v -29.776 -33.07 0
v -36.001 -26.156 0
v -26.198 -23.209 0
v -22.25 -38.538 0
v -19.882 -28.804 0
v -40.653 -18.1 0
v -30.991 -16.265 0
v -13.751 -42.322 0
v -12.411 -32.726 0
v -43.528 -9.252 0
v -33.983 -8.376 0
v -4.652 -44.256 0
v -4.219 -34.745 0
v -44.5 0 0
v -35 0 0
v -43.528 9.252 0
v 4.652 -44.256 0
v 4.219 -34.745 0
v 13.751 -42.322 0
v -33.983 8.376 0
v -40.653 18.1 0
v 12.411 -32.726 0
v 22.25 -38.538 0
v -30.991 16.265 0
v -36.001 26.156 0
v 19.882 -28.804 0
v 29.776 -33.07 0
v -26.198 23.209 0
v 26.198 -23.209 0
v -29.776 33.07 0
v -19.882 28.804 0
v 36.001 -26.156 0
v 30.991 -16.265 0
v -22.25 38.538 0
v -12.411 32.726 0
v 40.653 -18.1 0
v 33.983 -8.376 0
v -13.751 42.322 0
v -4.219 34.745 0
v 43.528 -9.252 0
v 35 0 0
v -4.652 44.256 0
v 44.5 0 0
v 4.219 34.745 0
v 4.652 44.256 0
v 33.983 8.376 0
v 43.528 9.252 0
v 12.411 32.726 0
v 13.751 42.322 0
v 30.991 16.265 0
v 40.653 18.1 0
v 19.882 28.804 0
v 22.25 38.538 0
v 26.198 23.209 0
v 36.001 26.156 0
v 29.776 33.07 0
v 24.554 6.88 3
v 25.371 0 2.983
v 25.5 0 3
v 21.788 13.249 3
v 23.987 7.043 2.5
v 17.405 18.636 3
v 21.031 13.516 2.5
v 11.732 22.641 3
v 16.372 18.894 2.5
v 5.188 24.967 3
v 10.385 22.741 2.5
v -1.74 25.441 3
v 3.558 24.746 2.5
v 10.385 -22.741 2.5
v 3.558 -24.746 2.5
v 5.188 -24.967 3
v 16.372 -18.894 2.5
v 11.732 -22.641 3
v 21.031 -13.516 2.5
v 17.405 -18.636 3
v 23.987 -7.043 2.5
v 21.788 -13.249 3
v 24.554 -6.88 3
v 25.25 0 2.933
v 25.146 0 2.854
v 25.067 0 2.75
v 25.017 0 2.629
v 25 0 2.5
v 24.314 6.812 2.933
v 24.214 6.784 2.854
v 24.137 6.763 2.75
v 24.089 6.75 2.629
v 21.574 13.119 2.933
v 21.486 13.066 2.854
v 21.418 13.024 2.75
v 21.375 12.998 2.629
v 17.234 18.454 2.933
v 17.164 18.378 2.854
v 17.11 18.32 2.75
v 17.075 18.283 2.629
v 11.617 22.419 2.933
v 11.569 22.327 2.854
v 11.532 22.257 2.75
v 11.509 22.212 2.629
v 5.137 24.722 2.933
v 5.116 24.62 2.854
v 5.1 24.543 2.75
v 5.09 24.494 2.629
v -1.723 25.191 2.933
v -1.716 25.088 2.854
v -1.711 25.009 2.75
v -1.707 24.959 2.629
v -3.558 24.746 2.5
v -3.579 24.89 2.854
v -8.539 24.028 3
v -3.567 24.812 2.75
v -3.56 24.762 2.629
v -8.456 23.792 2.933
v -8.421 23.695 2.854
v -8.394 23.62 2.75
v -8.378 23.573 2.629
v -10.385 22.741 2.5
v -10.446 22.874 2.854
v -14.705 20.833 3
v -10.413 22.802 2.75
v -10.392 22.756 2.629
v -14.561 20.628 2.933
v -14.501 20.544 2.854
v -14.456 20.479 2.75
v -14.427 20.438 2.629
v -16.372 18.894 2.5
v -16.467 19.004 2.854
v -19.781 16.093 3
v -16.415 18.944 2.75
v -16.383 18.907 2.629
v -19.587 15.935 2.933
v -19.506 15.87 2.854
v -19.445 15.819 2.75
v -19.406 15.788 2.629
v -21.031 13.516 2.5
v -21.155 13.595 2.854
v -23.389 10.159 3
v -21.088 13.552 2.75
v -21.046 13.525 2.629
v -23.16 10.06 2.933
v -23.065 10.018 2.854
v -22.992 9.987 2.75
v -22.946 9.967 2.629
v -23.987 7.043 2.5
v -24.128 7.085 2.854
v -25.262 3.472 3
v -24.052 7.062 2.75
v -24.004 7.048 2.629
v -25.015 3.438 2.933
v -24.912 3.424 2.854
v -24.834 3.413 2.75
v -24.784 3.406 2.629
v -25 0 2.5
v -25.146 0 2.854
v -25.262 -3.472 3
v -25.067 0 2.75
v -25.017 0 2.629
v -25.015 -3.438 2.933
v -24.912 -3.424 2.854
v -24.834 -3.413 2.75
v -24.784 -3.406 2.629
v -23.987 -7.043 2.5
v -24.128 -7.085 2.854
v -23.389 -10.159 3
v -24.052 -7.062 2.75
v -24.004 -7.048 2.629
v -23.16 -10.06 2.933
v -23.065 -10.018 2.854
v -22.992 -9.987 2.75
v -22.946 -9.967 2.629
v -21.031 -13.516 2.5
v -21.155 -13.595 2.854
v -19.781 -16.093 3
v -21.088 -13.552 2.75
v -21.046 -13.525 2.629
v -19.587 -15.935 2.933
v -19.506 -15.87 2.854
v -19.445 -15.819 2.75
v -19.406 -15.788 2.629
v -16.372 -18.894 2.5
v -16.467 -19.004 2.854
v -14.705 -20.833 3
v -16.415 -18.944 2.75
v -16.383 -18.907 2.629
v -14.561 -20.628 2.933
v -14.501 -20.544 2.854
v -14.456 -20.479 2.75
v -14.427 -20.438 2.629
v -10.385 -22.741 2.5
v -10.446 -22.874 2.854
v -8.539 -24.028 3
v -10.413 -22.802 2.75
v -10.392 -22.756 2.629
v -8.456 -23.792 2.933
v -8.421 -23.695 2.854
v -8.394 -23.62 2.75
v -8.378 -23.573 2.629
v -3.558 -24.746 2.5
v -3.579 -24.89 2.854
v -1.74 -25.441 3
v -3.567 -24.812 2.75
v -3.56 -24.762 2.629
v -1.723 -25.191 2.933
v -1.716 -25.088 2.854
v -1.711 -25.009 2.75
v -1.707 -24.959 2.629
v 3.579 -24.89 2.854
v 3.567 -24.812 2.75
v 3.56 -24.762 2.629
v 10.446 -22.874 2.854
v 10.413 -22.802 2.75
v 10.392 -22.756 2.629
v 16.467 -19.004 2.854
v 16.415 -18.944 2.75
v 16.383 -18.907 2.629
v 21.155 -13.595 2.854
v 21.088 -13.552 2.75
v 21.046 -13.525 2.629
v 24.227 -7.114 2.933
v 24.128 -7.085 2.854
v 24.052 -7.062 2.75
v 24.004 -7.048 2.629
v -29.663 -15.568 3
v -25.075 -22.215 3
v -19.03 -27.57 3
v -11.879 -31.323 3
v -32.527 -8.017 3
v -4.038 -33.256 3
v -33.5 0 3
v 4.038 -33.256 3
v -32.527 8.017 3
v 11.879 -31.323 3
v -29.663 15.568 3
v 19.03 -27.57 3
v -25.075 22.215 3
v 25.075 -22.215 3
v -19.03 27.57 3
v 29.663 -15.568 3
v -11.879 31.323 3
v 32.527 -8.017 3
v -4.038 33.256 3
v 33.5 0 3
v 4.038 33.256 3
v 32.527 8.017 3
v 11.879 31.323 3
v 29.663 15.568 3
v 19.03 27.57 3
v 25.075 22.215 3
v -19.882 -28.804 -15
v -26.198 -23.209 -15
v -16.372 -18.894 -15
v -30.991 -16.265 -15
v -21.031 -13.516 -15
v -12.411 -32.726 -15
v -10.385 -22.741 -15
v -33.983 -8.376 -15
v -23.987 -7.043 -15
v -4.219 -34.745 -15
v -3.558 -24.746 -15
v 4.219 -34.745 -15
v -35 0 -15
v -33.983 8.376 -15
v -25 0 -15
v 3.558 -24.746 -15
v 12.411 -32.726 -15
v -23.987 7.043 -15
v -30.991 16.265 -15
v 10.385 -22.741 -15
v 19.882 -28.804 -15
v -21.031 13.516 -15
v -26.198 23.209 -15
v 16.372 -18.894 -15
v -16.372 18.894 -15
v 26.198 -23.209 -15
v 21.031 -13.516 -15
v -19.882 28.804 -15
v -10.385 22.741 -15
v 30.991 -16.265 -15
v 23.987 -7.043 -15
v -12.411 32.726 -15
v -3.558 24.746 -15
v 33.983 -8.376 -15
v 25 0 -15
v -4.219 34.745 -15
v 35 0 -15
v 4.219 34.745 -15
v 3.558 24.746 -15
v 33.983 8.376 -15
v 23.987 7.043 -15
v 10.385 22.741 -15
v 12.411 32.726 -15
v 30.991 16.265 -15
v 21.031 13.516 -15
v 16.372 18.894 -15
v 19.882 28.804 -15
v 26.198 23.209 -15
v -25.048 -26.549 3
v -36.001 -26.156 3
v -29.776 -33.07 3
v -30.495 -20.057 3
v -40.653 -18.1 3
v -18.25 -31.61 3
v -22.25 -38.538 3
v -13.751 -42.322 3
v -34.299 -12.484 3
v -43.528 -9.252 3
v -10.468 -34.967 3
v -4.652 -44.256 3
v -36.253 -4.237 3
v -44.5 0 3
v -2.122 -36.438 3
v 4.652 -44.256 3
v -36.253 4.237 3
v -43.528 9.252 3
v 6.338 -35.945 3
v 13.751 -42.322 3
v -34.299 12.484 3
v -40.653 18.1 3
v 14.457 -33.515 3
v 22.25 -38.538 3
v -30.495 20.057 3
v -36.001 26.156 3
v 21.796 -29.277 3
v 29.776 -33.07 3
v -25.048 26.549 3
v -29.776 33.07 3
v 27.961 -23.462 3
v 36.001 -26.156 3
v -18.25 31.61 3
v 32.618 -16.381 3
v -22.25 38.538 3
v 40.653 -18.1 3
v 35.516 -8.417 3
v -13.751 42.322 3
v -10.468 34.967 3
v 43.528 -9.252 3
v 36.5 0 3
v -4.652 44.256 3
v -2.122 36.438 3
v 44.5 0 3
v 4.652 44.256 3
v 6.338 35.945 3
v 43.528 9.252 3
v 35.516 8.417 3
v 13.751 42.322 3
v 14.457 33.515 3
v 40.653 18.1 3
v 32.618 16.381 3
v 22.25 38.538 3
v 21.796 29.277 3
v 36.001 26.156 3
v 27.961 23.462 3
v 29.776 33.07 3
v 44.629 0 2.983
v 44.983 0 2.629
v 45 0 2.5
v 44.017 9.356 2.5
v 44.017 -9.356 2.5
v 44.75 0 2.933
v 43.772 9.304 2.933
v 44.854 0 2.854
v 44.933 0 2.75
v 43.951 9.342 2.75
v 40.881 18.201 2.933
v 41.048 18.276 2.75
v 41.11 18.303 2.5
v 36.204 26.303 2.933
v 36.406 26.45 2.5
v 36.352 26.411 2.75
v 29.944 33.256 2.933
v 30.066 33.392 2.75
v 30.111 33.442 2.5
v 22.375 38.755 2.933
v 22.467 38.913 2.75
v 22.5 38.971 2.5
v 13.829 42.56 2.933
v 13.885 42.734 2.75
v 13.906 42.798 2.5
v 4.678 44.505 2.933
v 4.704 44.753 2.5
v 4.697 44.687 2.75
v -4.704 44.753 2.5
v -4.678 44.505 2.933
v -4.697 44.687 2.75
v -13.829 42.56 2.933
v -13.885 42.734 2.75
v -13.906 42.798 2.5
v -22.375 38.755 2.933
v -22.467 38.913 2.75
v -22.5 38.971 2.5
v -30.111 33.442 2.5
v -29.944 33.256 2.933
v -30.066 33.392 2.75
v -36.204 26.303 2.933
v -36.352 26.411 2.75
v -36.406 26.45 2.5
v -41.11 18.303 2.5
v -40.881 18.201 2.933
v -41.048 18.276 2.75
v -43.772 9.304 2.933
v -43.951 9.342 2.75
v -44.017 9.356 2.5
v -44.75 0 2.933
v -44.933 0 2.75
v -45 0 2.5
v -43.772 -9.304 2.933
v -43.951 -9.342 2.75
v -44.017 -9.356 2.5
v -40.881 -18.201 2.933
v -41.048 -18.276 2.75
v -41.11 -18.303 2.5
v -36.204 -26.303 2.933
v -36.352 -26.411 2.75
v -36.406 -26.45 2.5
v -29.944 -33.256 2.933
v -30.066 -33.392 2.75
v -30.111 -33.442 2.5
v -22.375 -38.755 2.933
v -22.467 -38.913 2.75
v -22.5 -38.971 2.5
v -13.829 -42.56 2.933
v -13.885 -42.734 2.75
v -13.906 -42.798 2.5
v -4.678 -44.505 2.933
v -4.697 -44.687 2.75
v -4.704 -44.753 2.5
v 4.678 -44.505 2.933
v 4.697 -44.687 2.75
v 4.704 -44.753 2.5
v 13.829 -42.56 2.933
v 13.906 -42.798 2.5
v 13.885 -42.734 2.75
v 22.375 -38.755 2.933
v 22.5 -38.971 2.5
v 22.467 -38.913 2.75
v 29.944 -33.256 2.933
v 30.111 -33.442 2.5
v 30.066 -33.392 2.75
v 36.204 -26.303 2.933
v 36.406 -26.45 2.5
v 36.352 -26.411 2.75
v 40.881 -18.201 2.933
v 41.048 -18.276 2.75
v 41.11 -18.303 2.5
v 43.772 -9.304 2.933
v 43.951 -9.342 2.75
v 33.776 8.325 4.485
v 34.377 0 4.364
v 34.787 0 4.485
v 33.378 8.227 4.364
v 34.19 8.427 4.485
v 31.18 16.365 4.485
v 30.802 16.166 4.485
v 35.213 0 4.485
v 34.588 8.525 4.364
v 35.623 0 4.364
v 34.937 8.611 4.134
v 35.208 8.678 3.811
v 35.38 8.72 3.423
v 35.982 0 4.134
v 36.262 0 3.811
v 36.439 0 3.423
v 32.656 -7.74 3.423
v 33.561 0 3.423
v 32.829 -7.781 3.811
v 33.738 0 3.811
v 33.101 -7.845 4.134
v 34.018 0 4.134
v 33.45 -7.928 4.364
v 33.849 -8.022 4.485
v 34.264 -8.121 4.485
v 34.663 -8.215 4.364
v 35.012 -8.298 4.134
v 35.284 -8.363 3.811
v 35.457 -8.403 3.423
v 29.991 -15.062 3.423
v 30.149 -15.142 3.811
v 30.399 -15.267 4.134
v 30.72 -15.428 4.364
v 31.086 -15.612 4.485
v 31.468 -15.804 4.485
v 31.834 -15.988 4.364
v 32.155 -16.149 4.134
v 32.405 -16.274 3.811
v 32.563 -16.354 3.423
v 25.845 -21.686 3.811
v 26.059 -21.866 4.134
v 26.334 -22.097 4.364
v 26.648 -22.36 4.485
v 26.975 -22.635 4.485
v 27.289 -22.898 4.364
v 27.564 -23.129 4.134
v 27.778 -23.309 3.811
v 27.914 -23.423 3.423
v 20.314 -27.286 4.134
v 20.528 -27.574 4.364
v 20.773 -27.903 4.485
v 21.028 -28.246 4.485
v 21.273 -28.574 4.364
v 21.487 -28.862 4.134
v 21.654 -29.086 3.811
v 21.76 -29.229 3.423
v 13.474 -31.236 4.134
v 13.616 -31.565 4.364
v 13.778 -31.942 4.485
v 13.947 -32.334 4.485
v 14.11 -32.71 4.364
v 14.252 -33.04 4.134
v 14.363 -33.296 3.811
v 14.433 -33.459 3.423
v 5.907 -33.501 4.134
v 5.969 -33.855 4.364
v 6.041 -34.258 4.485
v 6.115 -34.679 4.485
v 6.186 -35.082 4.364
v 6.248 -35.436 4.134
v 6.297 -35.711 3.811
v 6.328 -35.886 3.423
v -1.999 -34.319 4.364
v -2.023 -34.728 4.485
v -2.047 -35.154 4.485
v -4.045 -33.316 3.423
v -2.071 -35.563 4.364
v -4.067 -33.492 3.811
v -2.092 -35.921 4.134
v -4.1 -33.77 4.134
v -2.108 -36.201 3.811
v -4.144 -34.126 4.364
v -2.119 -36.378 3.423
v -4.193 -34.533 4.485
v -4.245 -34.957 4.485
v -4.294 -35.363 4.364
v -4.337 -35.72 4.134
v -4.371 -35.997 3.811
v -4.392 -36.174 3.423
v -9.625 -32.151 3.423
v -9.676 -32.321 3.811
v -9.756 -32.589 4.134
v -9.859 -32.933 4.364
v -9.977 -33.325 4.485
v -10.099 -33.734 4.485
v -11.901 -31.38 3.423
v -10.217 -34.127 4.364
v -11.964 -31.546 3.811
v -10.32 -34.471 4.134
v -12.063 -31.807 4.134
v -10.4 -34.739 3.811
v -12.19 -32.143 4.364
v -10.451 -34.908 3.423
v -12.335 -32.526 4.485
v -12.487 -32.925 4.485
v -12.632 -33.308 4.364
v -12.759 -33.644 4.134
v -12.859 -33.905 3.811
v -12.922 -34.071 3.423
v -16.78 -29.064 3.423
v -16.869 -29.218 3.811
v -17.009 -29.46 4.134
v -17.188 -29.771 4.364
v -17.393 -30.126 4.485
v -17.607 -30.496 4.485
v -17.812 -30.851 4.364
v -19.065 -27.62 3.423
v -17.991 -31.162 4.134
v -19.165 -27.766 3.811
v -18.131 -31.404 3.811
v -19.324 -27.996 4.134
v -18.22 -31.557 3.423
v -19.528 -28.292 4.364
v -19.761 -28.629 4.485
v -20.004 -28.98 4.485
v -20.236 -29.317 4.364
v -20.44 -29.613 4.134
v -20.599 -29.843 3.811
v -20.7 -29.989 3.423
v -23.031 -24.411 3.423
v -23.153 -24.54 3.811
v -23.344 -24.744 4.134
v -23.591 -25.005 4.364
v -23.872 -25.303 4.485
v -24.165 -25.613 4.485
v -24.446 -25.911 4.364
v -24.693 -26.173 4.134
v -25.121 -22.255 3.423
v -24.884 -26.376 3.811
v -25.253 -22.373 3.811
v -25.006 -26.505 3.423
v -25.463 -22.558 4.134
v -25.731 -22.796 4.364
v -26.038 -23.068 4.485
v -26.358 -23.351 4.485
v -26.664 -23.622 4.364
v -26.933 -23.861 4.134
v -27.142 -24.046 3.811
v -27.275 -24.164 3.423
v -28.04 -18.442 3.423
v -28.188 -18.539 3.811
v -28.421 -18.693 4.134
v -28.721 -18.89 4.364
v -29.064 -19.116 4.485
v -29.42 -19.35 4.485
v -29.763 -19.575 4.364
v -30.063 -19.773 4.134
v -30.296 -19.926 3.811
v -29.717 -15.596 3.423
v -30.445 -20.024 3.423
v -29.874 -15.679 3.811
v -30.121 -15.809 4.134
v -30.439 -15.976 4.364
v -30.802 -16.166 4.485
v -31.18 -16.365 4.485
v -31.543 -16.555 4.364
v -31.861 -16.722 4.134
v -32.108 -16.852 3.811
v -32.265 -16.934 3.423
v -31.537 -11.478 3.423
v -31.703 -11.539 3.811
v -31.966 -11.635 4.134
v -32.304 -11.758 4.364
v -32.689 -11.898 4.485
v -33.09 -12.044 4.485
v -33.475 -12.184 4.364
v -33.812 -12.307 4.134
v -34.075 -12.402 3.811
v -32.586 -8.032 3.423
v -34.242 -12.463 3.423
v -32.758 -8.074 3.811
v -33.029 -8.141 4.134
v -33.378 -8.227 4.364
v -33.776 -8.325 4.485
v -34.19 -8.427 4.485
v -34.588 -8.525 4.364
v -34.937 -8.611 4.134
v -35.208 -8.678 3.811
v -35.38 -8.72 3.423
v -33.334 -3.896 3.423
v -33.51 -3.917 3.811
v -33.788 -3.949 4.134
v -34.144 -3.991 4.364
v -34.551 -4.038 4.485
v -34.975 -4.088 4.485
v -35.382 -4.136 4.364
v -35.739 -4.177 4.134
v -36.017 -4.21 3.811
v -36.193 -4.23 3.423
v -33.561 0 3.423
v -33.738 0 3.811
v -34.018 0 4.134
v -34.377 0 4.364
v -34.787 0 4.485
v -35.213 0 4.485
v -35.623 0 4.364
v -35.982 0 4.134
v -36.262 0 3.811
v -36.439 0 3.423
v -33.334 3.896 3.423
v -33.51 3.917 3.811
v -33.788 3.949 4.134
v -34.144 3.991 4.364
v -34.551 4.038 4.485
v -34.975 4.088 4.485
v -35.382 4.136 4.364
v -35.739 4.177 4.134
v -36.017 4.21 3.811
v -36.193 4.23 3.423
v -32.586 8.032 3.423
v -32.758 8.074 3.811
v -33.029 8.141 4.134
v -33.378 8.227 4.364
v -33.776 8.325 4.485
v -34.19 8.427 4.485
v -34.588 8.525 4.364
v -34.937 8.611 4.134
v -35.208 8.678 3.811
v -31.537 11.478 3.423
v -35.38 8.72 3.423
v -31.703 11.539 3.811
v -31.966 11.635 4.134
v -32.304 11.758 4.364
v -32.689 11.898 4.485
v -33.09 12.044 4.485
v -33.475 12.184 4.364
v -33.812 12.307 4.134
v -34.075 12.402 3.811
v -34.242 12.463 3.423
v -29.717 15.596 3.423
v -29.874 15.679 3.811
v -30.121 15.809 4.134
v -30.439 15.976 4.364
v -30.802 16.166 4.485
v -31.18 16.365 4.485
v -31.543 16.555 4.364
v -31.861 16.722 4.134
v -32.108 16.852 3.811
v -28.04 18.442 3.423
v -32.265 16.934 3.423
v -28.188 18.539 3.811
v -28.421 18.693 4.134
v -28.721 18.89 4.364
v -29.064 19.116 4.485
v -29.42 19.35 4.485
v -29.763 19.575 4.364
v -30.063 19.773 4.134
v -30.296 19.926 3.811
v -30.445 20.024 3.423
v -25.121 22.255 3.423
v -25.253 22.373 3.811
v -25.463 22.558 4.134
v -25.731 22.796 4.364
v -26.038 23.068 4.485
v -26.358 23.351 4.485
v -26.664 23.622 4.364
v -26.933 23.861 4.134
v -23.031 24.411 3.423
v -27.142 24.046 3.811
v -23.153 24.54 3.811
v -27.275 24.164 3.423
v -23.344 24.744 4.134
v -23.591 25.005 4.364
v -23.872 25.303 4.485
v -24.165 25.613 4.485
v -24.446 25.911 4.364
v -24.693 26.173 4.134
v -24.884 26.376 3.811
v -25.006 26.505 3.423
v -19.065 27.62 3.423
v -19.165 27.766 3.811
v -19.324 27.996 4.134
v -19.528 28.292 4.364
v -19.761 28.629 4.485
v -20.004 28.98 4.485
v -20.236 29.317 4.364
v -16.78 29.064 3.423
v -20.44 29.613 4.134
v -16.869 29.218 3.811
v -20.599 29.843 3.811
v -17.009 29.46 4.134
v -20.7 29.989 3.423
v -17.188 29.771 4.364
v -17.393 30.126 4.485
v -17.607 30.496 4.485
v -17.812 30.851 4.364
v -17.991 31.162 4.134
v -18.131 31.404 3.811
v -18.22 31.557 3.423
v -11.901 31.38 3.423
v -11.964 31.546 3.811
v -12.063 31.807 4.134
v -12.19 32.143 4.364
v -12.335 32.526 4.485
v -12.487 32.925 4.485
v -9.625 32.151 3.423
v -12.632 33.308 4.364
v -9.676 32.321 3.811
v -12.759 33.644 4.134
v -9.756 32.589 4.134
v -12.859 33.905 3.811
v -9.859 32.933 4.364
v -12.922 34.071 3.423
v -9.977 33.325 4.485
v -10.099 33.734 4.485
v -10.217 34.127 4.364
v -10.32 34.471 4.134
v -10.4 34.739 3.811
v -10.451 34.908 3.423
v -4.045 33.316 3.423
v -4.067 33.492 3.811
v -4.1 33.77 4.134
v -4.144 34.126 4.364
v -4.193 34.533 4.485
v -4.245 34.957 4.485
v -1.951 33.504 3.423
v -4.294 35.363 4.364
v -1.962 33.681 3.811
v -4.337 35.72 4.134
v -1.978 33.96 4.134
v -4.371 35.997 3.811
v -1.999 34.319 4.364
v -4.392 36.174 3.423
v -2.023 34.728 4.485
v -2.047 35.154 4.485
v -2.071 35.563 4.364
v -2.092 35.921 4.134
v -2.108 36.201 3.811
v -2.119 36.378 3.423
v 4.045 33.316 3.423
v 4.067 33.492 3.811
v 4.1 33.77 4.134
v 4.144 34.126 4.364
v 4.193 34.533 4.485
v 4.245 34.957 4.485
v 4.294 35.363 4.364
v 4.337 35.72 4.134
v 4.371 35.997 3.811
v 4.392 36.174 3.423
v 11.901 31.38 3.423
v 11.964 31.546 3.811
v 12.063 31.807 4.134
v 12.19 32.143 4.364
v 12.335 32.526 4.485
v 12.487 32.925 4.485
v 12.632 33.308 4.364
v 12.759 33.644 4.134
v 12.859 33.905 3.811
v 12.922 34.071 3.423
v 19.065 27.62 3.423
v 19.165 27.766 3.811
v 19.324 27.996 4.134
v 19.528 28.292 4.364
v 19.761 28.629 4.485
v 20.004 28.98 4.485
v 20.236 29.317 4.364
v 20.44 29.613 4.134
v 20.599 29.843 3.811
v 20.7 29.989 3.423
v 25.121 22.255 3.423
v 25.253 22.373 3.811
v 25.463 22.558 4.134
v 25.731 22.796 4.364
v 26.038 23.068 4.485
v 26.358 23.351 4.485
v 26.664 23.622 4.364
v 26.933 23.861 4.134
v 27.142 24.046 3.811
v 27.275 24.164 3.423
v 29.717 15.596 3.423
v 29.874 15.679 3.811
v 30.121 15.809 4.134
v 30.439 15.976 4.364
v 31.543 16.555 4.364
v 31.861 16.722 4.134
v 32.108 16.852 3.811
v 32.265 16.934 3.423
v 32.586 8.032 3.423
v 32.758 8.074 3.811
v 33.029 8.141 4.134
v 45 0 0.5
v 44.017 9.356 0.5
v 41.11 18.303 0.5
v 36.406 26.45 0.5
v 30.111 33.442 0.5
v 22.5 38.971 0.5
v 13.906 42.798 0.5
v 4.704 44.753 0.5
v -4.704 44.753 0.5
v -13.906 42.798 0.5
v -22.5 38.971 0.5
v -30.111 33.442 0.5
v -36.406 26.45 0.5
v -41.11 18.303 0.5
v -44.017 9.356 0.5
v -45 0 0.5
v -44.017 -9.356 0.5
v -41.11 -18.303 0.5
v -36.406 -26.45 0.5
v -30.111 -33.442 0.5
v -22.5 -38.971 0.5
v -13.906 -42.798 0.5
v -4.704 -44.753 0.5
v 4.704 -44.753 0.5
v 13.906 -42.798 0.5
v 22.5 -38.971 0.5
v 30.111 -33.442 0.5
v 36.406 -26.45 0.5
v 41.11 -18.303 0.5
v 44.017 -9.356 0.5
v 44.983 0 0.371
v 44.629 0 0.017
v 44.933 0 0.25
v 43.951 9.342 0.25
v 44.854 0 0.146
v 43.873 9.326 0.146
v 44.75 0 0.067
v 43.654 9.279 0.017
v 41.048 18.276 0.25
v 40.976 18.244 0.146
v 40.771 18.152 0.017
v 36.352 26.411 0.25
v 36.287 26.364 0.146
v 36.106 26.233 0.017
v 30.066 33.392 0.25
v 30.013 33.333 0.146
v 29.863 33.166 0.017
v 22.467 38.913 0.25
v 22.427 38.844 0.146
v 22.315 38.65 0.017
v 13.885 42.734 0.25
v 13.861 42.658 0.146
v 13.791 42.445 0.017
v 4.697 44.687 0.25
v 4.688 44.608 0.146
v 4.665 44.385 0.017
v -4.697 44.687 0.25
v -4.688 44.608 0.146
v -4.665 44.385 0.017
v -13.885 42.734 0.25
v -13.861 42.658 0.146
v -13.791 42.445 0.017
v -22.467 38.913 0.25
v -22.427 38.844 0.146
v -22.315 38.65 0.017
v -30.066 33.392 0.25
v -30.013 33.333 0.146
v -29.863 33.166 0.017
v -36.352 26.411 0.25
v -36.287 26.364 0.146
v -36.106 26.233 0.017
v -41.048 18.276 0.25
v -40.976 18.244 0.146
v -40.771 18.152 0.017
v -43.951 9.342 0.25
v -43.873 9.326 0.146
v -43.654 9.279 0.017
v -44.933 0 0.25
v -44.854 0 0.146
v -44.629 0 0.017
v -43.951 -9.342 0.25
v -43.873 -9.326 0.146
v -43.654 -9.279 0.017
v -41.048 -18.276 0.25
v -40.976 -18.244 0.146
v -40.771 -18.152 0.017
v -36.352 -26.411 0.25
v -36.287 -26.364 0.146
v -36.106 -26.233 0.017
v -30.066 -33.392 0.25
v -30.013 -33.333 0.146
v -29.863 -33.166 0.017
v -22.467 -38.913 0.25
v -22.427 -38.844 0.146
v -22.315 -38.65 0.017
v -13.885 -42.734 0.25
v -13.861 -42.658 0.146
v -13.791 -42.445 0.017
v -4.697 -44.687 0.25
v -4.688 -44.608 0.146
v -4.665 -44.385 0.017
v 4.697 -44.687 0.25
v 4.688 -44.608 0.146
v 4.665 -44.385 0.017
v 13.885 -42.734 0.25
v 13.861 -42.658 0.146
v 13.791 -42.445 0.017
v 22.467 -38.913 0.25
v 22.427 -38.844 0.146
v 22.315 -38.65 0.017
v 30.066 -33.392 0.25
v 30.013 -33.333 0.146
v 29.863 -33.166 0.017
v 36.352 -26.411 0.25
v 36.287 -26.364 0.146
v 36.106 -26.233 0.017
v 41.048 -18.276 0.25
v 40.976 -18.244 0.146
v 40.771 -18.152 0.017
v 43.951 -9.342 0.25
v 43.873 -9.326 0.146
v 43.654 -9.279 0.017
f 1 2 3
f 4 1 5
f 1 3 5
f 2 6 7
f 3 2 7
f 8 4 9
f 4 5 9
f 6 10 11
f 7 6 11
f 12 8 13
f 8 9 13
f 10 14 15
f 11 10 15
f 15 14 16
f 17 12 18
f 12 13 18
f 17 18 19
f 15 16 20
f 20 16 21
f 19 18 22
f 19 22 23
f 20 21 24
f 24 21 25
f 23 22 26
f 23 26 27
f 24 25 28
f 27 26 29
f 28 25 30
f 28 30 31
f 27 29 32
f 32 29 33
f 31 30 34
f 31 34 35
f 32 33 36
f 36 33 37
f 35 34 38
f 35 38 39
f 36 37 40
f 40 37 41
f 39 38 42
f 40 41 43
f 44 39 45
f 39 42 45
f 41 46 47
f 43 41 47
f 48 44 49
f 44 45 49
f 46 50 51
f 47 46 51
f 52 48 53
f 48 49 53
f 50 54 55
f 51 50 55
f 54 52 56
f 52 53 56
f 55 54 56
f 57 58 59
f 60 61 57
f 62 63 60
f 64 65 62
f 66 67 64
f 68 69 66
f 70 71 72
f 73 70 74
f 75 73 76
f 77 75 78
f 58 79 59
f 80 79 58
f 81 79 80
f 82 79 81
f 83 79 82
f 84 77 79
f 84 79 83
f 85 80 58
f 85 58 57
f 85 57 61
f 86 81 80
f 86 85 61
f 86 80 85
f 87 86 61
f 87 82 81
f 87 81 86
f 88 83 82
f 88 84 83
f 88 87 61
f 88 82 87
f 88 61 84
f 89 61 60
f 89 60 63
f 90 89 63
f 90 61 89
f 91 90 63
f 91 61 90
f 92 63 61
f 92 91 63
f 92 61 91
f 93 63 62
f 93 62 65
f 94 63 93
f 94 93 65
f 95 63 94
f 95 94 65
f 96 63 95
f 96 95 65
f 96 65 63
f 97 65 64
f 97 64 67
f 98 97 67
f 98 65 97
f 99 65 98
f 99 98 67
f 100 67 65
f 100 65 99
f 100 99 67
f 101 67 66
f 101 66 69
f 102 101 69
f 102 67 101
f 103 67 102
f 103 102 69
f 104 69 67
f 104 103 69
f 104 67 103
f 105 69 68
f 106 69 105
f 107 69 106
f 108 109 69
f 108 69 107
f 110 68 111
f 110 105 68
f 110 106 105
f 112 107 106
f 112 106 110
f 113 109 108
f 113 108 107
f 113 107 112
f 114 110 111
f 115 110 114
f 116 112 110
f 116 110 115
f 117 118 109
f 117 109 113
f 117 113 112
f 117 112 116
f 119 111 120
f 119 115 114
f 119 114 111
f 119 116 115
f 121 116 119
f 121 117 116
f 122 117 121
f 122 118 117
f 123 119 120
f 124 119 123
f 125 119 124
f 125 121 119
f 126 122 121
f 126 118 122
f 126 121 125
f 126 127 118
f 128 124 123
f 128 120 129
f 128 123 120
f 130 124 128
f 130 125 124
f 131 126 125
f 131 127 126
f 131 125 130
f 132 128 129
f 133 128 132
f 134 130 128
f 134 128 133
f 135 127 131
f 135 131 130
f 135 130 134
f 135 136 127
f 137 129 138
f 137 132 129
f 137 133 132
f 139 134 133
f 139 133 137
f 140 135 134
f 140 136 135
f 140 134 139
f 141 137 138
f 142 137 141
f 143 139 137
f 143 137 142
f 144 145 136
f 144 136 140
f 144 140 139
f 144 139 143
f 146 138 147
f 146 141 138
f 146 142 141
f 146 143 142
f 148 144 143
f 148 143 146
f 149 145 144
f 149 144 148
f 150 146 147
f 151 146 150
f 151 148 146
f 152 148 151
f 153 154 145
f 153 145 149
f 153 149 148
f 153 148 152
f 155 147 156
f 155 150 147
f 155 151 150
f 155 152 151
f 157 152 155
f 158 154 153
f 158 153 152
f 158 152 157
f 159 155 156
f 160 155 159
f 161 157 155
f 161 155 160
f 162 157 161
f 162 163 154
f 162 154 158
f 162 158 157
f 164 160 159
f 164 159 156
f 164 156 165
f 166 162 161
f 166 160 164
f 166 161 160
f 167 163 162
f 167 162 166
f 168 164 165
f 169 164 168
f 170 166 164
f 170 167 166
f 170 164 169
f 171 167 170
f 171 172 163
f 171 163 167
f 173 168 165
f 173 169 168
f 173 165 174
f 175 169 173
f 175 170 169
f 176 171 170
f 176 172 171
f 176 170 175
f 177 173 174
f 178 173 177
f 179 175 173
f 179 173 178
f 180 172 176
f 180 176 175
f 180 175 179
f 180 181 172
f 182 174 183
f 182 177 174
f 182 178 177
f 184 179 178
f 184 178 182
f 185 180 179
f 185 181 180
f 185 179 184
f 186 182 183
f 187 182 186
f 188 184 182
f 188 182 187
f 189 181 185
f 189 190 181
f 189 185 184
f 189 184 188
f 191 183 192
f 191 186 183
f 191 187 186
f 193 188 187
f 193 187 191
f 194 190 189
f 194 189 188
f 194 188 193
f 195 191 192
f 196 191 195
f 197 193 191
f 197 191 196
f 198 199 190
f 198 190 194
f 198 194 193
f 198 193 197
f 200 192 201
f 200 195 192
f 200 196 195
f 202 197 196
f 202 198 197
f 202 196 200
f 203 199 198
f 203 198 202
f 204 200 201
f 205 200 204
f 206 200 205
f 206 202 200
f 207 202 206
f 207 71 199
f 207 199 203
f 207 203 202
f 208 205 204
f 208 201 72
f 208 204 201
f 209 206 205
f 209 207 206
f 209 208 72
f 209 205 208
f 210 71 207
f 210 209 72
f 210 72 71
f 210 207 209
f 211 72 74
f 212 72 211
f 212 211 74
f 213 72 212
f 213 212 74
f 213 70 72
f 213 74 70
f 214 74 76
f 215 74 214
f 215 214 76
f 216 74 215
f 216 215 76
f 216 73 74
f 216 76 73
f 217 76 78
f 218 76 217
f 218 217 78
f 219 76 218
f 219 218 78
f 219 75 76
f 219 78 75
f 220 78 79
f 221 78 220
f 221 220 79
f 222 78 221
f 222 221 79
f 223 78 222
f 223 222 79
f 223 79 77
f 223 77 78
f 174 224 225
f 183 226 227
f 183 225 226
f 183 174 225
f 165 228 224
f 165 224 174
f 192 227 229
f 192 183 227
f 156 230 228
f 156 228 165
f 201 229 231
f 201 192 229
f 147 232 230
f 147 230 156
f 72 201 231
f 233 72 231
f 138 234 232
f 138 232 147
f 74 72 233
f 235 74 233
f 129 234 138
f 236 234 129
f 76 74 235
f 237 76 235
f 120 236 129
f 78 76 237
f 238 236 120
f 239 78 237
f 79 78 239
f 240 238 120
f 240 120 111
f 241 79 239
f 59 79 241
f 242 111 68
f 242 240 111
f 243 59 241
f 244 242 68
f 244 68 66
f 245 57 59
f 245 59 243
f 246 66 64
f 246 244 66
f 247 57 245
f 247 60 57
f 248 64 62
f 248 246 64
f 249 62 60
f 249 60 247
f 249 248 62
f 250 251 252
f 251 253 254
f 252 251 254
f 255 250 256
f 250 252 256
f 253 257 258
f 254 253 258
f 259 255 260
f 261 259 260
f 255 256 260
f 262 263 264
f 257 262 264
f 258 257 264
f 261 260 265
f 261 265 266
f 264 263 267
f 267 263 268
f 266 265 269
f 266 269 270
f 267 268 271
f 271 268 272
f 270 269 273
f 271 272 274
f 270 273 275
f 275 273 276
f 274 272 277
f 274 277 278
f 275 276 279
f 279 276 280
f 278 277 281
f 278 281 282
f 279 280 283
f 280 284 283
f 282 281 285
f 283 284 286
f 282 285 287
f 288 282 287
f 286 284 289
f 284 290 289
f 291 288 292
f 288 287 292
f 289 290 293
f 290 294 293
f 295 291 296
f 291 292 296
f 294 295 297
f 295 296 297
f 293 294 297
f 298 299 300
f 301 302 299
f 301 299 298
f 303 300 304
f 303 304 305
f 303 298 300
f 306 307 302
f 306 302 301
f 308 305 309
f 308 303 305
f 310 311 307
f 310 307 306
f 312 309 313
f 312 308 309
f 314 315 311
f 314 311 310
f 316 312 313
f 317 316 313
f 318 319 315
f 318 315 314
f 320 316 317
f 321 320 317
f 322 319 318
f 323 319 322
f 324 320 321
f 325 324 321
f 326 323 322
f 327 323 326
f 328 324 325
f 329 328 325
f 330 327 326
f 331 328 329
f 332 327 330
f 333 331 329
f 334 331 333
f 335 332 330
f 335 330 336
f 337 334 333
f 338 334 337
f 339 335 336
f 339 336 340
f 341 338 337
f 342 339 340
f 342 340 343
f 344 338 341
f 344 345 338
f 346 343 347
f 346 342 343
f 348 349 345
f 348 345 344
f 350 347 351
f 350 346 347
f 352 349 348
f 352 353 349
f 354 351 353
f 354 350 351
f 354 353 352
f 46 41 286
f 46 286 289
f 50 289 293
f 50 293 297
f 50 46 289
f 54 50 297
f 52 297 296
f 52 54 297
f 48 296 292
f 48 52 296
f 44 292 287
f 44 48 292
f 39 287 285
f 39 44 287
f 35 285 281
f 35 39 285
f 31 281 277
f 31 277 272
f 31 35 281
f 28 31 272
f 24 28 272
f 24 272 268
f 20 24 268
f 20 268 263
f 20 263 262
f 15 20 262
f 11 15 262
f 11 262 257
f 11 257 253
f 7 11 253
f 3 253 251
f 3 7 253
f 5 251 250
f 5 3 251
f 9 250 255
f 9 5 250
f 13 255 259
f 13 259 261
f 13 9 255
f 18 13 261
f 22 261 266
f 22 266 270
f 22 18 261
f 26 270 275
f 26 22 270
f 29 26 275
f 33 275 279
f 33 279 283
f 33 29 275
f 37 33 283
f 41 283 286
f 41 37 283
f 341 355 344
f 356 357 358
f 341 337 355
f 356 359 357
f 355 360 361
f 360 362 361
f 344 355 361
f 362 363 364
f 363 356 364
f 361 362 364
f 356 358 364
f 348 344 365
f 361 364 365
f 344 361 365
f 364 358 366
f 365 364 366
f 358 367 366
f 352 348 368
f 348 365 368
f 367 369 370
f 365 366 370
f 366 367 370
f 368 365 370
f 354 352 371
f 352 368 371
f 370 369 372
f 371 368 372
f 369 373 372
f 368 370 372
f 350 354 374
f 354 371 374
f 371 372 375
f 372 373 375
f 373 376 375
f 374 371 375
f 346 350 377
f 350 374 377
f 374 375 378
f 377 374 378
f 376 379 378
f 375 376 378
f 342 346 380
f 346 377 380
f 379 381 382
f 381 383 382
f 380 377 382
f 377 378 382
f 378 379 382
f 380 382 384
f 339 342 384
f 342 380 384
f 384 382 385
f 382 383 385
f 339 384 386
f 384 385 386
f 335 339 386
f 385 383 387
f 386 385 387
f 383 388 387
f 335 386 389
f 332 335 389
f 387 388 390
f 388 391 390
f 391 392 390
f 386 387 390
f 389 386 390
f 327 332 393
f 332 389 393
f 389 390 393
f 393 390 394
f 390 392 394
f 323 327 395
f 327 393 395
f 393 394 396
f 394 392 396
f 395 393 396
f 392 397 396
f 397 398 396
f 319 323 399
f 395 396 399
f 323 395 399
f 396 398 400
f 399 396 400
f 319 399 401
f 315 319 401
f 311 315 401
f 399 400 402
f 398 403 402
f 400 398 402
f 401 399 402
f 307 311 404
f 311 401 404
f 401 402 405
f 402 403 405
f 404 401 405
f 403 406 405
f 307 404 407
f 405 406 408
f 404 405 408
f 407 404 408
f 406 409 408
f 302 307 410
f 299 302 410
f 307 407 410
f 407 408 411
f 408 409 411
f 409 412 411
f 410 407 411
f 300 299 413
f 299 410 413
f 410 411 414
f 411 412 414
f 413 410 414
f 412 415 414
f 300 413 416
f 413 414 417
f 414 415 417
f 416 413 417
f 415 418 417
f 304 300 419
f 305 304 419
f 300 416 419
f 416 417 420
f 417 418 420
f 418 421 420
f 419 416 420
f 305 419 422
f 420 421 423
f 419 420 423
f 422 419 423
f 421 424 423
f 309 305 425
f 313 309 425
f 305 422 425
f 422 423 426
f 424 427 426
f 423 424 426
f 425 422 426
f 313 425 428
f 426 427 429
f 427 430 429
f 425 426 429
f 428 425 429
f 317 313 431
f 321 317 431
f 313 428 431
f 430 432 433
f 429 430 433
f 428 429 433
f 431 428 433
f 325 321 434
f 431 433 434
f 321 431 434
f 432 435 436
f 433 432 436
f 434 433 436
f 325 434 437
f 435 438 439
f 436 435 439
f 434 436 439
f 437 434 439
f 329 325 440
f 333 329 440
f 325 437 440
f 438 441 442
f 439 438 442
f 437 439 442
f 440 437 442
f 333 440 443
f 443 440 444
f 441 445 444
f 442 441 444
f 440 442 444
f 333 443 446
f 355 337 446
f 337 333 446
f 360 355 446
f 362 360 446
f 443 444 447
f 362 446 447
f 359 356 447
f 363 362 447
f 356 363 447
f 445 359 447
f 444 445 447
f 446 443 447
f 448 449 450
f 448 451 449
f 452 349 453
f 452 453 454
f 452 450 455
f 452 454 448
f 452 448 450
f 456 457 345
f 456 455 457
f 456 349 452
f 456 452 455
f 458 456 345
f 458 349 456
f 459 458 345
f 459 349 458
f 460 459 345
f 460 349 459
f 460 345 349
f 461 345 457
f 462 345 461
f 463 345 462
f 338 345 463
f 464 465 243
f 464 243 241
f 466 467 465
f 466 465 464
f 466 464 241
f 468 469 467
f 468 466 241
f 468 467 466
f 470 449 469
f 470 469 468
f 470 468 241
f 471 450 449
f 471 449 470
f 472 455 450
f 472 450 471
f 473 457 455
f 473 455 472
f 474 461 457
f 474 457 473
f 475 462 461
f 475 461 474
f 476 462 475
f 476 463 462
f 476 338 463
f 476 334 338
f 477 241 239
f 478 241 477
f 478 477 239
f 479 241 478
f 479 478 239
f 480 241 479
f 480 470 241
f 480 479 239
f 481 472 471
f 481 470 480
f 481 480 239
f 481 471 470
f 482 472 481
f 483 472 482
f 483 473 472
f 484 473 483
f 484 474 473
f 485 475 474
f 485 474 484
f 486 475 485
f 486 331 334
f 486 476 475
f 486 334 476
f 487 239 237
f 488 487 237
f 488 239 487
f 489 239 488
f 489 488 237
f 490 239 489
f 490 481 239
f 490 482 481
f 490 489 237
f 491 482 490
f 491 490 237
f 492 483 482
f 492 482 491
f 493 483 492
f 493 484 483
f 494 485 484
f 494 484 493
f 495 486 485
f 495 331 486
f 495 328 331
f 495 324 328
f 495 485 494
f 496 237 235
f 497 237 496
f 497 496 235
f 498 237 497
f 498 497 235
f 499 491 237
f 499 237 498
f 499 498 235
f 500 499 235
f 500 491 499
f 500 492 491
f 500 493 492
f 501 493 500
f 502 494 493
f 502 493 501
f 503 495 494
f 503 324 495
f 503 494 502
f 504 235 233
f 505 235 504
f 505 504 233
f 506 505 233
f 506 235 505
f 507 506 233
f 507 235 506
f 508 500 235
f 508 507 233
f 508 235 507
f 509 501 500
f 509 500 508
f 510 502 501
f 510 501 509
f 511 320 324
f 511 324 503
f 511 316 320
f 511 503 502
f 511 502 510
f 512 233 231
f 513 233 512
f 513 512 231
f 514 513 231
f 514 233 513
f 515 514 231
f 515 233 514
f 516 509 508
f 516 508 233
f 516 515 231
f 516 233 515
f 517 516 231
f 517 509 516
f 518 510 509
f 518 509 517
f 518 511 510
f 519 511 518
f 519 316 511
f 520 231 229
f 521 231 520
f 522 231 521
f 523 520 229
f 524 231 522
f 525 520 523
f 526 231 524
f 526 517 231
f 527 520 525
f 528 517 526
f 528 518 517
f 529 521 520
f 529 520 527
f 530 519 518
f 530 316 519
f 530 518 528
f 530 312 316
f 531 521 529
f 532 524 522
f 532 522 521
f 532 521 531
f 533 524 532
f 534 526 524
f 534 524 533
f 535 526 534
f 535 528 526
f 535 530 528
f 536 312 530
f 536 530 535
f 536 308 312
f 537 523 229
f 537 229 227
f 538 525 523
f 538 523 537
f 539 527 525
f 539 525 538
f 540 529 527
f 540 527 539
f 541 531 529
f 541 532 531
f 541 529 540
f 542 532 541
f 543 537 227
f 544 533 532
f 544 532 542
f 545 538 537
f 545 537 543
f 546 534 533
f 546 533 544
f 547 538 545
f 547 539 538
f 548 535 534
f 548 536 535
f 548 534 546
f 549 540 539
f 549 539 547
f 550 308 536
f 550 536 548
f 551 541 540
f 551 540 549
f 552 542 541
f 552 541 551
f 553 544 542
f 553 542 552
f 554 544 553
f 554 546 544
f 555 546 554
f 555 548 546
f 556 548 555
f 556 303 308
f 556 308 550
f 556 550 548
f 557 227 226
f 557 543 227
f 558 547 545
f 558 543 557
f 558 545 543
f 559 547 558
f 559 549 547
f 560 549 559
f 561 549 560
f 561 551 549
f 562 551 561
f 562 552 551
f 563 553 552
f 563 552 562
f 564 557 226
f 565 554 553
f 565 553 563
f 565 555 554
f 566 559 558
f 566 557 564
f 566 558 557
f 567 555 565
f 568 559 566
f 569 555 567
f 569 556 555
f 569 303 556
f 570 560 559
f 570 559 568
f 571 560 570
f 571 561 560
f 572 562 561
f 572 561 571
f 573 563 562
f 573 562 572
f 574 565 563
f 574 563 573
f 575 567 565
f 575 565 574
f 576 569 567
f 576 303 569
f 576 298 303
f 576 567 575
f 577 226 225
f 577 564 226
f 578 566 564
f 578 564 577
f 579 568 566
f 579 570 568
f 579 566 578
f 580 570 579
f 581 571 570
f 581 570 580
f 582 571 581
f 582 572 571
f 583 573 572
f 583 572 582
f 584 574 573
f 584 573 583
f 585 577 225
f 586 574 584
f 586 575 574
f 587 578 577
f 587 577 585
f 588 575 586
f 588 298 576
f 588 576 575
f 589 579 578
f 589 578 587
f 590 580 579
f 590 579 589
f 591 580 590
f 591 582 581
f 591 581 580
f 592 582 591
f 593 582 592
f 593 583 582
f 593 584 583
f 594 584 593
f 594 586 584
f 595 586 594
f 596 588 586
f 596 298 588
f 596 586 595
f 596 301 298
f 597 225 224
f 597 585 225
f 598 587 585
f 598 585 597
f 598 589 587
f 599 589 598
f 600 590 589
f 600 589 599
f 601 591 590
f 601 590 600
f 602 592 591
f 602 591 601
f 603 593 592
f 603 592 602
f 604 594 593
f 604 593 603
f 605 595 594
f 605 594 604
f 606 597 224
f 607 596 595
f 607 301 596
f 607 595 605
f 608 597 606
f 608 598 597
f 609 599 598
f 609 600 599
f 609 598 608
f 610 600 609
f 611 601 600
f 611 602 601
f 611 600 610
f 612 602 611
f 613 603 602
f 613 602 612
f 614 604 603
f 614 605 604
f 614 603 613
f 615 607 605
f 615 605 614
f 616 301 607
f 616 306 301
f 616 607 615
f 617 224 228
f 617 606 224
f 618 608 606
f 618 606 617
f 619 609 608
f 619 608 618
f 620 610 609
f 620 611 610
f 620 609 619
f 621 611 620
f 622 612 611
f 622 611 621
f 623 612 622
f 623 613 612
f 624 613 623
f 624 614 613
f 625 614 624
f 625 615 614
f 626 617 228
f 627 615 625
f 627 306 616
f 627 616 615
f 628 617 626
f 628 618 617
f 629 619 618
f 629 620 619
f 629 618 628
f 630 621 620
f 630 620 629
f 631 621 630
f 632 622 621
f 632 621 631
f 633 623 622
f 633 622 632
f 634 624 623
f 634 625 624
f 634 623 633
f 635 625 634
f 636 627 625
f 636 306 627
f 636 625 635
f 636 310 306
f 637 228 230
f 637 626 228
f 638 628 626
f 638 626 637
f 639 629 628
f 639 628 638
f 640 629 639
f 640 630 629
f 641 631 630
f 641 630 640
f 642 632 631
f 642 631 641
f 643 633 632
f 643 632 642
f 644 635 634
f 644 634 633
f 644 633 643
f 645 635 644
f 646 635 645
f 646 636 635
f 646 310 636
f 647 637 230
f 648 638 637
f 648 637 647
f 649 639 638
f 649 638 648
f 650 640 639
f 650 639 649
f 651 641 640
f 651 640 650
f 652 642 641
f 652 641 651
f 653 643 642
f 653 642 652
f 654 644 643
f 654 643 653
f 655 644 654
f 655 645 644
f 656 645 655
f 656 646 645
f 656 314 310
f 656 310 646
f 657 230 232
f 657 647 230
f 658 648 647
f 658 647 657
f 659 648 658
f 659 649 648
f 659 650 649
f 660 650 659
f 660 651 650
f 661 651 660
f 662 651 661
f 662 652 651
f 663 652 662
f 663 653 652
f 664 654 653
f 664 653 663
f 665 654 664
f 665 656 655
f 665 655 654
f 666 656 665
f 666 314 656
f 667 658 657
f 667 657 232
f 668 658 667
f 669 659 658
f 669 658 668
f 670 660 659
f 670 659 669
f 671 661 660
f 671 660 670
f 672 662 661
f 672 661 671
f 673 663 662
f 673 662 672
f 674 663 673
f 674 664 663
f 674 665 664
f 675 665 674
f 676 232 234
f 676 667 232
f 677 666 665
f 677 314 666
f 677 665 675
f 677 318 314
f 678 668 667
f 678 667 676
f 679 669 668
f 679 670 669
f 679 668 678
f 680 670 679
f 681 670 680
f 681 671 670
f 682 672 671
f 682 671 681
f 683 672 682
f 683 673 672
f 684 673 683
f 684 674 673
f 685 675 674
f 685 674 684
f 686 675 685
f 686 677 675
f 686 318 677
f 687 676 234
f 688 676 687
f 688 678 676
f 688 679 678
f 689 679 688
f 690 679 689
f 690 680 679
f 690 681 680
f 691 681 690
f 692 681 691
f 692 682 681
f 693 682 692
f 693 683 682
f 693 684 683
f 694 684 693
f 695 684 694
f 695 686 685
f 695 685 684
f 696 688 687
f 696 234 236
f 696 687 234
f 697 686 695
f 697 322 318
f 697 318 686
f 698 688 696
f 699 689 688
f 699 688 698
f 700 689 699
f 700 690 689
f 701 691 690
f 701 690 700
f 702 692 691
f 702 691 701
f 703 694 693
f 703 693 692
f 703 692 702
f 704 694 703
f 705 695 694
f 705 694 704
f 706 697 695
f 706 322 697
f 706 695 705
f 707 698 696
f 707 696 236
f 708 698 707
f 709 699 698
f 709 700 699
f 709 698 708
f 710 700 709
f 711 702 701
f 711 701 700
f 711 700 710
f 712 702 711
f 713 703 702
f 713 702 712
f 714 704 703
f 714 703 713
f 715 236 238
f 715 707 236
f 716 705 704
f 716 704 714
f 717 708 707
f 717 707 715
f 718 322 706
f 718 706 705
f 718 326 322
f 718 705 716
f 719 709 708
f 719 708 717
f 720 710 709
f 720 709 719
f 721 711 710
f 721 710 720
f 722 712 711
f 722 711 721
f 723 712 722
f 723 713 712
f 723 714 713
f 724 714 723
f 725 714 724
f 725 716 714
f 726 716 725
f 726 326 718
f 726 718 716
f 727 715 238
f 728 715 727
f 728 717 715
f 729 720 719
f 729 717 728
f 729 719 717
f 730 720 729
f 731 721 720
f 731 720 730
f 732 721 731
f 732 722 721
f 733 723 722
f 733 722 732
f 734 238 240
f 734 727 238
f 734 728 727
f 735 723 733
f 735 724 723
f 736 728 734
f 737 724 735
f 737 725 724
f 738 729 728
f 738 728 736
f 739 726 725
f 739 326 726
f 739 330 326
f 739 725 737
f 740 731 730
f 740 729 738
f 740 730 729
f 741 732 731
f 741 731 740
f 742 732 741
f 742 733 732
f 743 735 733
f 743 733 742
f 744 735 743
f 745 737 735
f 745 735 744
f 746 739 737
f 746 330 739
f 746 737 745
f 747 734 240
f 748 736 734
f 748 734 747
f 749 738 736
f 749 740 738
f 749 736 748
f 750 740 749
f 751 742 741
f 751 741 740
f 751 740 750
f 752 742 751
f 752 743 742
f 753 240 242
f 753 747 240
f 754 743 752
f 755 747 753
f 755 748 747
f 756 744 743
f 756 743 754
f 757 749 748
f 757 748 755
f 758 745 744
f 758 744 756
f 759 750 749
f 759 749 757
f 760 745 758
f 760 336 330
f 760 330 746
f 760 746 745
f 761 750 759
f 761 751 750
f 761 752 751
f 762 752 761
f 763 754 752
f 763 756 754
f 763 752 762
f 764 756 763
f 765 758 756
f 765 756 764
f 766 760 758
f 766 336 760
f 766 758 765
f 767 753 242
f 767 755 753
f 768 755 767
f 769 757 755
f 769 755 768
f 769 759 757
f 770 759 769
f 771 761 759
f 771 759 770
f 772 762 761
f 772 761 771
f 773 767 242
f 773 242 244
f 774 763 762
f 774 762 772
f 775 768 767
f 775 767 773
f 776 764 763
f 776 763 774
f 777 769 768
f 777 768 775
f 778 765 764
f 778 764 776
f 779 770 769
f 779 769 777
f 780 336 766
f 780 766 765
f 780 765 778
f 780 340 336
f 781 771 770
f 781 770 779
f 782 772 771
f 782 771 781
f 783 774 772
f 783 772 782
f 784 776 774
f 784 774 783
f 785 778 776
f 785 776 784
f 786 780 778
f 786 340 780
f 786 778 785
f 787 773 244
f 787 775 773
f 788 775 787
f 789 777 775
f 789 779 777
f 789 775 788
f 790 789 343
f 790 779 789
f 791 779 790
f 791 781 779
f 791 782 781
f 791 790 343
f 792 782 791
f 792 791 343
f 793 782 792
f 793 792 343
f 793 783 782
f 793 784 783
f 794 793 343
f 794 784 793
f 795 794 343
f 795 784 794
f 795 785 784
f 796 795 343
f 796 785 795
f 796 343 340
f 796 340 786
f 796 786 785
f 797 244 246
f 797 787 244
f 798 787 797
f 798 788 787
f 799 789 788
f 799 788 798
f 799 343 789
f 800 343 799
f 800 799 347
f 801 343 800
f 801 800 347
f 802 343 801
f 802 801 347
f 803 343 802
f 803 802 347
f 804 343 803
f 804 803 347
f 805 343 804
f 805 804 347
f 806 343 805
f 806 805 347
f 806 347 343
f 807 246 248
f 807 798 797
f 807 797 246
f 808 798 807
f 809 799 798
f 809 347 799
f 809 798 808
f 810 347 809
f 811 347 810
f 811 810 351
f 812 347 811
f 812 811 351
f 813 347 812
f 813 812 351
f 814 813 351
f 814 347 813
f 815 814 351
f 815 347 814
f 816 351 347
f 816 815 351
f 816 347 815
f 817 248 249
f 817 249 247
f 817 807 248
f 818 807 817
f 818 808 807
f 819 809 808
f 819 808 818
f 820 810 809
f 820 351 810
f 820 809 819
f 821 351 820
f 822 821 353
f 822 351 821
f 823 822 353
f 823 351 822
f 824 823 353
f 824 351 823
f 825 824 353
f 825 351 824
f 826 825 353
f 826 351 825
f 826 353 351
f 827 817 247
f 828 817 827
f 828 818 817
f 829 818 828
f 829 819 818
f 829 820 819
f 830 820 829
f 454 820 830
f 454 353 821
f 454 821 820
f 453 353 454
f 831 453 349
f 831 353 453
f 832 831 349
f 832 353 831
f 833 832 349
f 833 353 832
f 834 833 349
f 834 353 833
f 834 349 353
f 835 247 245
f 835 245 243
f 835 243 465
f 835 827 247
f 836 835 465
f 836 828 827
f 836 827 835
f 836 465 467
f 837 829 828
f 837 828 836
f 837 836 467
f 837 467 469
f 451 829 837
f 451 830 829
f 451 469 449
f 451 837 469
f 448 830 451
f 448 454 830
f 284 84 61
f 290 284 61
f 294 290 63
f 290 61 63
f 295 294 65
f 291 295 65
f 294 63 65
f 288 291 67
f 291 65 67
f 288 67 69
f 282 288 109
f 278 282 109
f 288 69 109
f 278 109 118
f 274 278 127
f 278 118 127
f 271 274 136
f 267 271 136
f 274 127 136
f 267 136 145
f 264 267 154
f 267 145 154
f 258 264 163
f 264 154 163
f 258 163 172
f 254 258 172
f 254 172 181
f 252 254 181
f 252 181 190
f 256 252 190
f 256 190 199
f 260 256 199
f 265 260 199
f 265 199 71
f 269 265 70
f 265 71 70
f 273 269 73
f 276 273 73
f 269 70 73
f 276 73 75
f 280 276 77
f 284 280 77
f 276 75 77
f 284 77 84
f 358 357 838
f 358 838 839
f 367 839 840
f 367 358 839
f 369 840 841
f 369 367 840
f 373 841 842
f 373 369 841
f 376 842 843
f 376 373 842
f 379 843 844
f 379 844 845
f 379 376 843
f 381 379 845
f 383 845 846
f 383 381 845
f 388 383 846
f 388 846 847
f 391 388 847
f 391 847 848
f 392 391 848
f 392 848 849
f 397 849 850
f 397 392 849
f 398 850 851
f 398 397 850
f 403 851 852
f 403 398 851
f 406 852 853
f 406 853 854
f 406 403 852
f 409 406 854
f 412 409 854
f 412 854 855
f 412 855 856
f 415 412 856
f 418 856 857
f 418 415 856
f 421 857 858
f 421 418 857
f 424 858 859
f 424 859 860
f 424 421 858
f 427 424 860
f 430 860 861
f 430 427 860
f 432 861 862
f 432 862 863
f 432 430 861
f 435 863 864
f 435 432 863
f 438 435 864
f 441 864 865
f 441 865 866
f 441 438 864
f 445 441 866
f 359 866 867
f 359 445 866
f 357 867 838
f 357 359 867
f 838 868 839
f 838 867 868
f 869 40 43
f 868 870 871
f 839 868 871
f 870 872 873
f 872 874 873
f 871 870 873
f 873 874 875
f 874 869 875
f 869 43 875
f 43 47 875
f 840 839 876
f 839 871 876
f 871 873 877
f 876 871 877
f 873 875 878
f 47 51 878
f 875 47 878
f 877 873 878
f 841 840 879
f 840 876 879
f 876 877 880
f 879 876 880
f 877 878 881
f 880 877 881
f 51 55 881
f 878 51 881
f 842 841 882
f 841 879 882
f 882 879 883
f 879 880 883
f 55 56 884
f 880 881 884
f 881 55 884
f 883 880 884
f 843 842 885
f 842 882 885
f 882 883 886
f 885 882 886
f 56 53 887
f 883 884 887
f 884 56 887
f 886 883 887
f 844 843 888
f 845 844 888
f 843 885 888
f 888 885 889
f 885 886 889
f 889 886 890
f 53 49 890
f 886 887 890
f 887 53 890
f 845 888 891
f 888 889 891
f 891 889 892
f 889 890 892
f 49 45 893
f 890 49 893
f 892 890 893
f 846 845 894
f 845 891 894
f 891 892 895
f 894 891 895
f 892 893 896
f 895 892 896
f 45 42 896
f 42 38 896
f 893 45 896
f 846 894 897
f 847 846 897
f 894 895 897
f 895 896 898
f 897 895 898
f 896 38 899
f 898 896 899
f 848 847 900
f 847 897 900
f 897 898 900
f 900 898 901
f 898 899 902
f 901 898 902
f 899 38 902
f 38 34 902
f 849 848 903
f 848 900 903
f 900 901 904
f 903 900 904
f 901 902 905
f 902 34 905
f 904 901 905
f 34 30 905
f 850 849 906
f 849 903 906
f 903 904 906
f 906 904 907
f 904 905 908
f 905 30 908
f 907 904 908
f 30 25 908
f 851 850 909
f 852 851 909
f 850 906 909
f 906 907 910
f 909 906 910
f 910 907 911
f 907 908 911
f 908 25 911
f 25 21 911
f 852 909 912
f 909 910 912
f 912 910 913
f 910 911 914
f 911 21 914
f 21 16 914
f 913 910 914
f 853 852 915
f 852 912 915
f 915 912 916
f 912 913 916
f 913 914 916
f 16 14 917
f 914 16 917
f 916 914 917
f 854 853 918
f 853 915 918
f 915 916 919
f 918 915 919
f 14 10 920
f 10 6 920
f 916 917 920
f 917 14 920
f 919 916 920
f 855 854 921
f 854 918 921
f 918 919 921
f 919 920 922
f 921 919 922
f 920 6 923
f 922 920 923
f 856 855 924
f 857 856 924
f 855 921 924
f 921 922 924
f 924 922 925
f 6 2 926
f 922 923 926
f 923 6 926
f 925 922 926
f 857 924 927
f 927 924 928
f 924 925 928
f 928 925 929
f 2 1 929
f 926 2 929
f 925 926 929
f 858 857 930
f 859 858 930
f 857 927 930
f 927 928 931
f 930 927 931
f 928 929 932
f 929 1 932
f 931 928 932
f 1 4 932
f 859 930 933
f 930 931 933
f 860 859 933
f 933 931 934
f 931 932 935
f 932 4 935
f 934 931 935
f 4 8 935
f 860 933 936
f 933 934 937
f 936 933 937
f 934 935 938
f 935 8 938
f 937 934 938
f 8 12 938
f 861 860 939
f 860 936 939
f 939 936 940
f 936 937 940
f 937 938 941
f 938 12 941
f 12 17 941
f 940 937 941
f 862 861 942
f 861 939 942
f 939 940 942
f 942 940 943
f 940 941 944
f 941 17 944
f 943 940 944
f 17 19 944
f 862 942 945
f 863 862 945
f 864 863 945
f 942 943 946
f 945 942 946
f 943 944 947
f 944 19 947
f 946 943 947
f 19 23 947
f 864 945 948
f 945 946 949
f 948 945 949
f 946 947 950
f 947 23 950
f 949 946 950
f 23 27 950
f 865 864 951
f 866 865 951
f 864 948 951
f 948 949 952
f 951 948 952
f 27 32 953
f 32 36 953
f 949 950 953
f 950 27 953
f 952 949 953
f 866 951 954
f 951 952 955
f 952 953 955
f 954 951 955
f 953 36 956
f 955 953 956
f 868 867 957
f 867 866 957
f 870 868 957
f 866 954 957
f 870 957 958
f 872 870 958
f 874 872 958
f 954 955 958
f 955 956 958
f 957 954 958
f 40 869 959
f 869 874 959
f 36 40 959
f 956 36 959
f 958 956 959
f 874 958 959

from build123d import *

# Parameters (mm, degrees)
SKETCH1_R           = 35
SKETCH1_R_2         = 25
BOSS_EXTRUDE1_DEPTH = 15
BOSS_EXTRUDE2_START = 3
SKETCH2_R           = 45
SKETCH2_R_2         = 25
BOSS_EXTRUDE2_DEPTH = 3
SKETCH3_R           = 1.5
FILLET1_R           = 0.5


with BuildPart() as part:
    # Sketch1 → Boss-Extrude1 (new body)
    with BuildSketch(Plane(origin=(0, 0, 0), x_dir=(0, 1, 0), z_dir=(0, 0, 1))):
        with Locations(Location((0, 0, 0), (0, 0, 270))):
            Circle(SKETCH1_R)
        with Locations(Location((0, 0, 0), (0, 0, 270))):
            Circle(SKETCH1_R_2, mode=Mode.SUBTRACT)
    extrude(amount=-BOSS_EXTRUDE1_DEPTH)

    # Sketch2 → Boss-Extrude2 (add)
    with BuildSketch(Plane.XY.offset(BOSS_EXTRUDE2_START)):
        Circle(SKETCH2_R)
        Circle(SKETCH2_R_2, mode=Mode.SUBTRACT)
    extrude(amount=-BOSS_EXTRUDE2_DEPTH)

    # Sketch3 → Revolve1 (revolve)
    with BuildSketch(Plane.YZ, mode=Mode.PRIVATE) as revolve1_sk:
        with Locations((-35, 3)):
            Circle(SKETCH3_R)
    revolve(revolve1_sk.sketch.rotate(Axis((0, 0, 13.091516213), (0, 0, -1)), 270), axis=Axis((0, 0, 13.091516213), (0, 0, -1)))

    # Fillet1
    fillet1_edges = [part.edges().sort_by_distance(p)[0] for p in [
        (-45, 0, 3),
        (-45, 0, 0),
        (-25, 0, 3),
    ]]
    fillet(fillet1_edges, radius=FILLET1_R)


solid = part.part
